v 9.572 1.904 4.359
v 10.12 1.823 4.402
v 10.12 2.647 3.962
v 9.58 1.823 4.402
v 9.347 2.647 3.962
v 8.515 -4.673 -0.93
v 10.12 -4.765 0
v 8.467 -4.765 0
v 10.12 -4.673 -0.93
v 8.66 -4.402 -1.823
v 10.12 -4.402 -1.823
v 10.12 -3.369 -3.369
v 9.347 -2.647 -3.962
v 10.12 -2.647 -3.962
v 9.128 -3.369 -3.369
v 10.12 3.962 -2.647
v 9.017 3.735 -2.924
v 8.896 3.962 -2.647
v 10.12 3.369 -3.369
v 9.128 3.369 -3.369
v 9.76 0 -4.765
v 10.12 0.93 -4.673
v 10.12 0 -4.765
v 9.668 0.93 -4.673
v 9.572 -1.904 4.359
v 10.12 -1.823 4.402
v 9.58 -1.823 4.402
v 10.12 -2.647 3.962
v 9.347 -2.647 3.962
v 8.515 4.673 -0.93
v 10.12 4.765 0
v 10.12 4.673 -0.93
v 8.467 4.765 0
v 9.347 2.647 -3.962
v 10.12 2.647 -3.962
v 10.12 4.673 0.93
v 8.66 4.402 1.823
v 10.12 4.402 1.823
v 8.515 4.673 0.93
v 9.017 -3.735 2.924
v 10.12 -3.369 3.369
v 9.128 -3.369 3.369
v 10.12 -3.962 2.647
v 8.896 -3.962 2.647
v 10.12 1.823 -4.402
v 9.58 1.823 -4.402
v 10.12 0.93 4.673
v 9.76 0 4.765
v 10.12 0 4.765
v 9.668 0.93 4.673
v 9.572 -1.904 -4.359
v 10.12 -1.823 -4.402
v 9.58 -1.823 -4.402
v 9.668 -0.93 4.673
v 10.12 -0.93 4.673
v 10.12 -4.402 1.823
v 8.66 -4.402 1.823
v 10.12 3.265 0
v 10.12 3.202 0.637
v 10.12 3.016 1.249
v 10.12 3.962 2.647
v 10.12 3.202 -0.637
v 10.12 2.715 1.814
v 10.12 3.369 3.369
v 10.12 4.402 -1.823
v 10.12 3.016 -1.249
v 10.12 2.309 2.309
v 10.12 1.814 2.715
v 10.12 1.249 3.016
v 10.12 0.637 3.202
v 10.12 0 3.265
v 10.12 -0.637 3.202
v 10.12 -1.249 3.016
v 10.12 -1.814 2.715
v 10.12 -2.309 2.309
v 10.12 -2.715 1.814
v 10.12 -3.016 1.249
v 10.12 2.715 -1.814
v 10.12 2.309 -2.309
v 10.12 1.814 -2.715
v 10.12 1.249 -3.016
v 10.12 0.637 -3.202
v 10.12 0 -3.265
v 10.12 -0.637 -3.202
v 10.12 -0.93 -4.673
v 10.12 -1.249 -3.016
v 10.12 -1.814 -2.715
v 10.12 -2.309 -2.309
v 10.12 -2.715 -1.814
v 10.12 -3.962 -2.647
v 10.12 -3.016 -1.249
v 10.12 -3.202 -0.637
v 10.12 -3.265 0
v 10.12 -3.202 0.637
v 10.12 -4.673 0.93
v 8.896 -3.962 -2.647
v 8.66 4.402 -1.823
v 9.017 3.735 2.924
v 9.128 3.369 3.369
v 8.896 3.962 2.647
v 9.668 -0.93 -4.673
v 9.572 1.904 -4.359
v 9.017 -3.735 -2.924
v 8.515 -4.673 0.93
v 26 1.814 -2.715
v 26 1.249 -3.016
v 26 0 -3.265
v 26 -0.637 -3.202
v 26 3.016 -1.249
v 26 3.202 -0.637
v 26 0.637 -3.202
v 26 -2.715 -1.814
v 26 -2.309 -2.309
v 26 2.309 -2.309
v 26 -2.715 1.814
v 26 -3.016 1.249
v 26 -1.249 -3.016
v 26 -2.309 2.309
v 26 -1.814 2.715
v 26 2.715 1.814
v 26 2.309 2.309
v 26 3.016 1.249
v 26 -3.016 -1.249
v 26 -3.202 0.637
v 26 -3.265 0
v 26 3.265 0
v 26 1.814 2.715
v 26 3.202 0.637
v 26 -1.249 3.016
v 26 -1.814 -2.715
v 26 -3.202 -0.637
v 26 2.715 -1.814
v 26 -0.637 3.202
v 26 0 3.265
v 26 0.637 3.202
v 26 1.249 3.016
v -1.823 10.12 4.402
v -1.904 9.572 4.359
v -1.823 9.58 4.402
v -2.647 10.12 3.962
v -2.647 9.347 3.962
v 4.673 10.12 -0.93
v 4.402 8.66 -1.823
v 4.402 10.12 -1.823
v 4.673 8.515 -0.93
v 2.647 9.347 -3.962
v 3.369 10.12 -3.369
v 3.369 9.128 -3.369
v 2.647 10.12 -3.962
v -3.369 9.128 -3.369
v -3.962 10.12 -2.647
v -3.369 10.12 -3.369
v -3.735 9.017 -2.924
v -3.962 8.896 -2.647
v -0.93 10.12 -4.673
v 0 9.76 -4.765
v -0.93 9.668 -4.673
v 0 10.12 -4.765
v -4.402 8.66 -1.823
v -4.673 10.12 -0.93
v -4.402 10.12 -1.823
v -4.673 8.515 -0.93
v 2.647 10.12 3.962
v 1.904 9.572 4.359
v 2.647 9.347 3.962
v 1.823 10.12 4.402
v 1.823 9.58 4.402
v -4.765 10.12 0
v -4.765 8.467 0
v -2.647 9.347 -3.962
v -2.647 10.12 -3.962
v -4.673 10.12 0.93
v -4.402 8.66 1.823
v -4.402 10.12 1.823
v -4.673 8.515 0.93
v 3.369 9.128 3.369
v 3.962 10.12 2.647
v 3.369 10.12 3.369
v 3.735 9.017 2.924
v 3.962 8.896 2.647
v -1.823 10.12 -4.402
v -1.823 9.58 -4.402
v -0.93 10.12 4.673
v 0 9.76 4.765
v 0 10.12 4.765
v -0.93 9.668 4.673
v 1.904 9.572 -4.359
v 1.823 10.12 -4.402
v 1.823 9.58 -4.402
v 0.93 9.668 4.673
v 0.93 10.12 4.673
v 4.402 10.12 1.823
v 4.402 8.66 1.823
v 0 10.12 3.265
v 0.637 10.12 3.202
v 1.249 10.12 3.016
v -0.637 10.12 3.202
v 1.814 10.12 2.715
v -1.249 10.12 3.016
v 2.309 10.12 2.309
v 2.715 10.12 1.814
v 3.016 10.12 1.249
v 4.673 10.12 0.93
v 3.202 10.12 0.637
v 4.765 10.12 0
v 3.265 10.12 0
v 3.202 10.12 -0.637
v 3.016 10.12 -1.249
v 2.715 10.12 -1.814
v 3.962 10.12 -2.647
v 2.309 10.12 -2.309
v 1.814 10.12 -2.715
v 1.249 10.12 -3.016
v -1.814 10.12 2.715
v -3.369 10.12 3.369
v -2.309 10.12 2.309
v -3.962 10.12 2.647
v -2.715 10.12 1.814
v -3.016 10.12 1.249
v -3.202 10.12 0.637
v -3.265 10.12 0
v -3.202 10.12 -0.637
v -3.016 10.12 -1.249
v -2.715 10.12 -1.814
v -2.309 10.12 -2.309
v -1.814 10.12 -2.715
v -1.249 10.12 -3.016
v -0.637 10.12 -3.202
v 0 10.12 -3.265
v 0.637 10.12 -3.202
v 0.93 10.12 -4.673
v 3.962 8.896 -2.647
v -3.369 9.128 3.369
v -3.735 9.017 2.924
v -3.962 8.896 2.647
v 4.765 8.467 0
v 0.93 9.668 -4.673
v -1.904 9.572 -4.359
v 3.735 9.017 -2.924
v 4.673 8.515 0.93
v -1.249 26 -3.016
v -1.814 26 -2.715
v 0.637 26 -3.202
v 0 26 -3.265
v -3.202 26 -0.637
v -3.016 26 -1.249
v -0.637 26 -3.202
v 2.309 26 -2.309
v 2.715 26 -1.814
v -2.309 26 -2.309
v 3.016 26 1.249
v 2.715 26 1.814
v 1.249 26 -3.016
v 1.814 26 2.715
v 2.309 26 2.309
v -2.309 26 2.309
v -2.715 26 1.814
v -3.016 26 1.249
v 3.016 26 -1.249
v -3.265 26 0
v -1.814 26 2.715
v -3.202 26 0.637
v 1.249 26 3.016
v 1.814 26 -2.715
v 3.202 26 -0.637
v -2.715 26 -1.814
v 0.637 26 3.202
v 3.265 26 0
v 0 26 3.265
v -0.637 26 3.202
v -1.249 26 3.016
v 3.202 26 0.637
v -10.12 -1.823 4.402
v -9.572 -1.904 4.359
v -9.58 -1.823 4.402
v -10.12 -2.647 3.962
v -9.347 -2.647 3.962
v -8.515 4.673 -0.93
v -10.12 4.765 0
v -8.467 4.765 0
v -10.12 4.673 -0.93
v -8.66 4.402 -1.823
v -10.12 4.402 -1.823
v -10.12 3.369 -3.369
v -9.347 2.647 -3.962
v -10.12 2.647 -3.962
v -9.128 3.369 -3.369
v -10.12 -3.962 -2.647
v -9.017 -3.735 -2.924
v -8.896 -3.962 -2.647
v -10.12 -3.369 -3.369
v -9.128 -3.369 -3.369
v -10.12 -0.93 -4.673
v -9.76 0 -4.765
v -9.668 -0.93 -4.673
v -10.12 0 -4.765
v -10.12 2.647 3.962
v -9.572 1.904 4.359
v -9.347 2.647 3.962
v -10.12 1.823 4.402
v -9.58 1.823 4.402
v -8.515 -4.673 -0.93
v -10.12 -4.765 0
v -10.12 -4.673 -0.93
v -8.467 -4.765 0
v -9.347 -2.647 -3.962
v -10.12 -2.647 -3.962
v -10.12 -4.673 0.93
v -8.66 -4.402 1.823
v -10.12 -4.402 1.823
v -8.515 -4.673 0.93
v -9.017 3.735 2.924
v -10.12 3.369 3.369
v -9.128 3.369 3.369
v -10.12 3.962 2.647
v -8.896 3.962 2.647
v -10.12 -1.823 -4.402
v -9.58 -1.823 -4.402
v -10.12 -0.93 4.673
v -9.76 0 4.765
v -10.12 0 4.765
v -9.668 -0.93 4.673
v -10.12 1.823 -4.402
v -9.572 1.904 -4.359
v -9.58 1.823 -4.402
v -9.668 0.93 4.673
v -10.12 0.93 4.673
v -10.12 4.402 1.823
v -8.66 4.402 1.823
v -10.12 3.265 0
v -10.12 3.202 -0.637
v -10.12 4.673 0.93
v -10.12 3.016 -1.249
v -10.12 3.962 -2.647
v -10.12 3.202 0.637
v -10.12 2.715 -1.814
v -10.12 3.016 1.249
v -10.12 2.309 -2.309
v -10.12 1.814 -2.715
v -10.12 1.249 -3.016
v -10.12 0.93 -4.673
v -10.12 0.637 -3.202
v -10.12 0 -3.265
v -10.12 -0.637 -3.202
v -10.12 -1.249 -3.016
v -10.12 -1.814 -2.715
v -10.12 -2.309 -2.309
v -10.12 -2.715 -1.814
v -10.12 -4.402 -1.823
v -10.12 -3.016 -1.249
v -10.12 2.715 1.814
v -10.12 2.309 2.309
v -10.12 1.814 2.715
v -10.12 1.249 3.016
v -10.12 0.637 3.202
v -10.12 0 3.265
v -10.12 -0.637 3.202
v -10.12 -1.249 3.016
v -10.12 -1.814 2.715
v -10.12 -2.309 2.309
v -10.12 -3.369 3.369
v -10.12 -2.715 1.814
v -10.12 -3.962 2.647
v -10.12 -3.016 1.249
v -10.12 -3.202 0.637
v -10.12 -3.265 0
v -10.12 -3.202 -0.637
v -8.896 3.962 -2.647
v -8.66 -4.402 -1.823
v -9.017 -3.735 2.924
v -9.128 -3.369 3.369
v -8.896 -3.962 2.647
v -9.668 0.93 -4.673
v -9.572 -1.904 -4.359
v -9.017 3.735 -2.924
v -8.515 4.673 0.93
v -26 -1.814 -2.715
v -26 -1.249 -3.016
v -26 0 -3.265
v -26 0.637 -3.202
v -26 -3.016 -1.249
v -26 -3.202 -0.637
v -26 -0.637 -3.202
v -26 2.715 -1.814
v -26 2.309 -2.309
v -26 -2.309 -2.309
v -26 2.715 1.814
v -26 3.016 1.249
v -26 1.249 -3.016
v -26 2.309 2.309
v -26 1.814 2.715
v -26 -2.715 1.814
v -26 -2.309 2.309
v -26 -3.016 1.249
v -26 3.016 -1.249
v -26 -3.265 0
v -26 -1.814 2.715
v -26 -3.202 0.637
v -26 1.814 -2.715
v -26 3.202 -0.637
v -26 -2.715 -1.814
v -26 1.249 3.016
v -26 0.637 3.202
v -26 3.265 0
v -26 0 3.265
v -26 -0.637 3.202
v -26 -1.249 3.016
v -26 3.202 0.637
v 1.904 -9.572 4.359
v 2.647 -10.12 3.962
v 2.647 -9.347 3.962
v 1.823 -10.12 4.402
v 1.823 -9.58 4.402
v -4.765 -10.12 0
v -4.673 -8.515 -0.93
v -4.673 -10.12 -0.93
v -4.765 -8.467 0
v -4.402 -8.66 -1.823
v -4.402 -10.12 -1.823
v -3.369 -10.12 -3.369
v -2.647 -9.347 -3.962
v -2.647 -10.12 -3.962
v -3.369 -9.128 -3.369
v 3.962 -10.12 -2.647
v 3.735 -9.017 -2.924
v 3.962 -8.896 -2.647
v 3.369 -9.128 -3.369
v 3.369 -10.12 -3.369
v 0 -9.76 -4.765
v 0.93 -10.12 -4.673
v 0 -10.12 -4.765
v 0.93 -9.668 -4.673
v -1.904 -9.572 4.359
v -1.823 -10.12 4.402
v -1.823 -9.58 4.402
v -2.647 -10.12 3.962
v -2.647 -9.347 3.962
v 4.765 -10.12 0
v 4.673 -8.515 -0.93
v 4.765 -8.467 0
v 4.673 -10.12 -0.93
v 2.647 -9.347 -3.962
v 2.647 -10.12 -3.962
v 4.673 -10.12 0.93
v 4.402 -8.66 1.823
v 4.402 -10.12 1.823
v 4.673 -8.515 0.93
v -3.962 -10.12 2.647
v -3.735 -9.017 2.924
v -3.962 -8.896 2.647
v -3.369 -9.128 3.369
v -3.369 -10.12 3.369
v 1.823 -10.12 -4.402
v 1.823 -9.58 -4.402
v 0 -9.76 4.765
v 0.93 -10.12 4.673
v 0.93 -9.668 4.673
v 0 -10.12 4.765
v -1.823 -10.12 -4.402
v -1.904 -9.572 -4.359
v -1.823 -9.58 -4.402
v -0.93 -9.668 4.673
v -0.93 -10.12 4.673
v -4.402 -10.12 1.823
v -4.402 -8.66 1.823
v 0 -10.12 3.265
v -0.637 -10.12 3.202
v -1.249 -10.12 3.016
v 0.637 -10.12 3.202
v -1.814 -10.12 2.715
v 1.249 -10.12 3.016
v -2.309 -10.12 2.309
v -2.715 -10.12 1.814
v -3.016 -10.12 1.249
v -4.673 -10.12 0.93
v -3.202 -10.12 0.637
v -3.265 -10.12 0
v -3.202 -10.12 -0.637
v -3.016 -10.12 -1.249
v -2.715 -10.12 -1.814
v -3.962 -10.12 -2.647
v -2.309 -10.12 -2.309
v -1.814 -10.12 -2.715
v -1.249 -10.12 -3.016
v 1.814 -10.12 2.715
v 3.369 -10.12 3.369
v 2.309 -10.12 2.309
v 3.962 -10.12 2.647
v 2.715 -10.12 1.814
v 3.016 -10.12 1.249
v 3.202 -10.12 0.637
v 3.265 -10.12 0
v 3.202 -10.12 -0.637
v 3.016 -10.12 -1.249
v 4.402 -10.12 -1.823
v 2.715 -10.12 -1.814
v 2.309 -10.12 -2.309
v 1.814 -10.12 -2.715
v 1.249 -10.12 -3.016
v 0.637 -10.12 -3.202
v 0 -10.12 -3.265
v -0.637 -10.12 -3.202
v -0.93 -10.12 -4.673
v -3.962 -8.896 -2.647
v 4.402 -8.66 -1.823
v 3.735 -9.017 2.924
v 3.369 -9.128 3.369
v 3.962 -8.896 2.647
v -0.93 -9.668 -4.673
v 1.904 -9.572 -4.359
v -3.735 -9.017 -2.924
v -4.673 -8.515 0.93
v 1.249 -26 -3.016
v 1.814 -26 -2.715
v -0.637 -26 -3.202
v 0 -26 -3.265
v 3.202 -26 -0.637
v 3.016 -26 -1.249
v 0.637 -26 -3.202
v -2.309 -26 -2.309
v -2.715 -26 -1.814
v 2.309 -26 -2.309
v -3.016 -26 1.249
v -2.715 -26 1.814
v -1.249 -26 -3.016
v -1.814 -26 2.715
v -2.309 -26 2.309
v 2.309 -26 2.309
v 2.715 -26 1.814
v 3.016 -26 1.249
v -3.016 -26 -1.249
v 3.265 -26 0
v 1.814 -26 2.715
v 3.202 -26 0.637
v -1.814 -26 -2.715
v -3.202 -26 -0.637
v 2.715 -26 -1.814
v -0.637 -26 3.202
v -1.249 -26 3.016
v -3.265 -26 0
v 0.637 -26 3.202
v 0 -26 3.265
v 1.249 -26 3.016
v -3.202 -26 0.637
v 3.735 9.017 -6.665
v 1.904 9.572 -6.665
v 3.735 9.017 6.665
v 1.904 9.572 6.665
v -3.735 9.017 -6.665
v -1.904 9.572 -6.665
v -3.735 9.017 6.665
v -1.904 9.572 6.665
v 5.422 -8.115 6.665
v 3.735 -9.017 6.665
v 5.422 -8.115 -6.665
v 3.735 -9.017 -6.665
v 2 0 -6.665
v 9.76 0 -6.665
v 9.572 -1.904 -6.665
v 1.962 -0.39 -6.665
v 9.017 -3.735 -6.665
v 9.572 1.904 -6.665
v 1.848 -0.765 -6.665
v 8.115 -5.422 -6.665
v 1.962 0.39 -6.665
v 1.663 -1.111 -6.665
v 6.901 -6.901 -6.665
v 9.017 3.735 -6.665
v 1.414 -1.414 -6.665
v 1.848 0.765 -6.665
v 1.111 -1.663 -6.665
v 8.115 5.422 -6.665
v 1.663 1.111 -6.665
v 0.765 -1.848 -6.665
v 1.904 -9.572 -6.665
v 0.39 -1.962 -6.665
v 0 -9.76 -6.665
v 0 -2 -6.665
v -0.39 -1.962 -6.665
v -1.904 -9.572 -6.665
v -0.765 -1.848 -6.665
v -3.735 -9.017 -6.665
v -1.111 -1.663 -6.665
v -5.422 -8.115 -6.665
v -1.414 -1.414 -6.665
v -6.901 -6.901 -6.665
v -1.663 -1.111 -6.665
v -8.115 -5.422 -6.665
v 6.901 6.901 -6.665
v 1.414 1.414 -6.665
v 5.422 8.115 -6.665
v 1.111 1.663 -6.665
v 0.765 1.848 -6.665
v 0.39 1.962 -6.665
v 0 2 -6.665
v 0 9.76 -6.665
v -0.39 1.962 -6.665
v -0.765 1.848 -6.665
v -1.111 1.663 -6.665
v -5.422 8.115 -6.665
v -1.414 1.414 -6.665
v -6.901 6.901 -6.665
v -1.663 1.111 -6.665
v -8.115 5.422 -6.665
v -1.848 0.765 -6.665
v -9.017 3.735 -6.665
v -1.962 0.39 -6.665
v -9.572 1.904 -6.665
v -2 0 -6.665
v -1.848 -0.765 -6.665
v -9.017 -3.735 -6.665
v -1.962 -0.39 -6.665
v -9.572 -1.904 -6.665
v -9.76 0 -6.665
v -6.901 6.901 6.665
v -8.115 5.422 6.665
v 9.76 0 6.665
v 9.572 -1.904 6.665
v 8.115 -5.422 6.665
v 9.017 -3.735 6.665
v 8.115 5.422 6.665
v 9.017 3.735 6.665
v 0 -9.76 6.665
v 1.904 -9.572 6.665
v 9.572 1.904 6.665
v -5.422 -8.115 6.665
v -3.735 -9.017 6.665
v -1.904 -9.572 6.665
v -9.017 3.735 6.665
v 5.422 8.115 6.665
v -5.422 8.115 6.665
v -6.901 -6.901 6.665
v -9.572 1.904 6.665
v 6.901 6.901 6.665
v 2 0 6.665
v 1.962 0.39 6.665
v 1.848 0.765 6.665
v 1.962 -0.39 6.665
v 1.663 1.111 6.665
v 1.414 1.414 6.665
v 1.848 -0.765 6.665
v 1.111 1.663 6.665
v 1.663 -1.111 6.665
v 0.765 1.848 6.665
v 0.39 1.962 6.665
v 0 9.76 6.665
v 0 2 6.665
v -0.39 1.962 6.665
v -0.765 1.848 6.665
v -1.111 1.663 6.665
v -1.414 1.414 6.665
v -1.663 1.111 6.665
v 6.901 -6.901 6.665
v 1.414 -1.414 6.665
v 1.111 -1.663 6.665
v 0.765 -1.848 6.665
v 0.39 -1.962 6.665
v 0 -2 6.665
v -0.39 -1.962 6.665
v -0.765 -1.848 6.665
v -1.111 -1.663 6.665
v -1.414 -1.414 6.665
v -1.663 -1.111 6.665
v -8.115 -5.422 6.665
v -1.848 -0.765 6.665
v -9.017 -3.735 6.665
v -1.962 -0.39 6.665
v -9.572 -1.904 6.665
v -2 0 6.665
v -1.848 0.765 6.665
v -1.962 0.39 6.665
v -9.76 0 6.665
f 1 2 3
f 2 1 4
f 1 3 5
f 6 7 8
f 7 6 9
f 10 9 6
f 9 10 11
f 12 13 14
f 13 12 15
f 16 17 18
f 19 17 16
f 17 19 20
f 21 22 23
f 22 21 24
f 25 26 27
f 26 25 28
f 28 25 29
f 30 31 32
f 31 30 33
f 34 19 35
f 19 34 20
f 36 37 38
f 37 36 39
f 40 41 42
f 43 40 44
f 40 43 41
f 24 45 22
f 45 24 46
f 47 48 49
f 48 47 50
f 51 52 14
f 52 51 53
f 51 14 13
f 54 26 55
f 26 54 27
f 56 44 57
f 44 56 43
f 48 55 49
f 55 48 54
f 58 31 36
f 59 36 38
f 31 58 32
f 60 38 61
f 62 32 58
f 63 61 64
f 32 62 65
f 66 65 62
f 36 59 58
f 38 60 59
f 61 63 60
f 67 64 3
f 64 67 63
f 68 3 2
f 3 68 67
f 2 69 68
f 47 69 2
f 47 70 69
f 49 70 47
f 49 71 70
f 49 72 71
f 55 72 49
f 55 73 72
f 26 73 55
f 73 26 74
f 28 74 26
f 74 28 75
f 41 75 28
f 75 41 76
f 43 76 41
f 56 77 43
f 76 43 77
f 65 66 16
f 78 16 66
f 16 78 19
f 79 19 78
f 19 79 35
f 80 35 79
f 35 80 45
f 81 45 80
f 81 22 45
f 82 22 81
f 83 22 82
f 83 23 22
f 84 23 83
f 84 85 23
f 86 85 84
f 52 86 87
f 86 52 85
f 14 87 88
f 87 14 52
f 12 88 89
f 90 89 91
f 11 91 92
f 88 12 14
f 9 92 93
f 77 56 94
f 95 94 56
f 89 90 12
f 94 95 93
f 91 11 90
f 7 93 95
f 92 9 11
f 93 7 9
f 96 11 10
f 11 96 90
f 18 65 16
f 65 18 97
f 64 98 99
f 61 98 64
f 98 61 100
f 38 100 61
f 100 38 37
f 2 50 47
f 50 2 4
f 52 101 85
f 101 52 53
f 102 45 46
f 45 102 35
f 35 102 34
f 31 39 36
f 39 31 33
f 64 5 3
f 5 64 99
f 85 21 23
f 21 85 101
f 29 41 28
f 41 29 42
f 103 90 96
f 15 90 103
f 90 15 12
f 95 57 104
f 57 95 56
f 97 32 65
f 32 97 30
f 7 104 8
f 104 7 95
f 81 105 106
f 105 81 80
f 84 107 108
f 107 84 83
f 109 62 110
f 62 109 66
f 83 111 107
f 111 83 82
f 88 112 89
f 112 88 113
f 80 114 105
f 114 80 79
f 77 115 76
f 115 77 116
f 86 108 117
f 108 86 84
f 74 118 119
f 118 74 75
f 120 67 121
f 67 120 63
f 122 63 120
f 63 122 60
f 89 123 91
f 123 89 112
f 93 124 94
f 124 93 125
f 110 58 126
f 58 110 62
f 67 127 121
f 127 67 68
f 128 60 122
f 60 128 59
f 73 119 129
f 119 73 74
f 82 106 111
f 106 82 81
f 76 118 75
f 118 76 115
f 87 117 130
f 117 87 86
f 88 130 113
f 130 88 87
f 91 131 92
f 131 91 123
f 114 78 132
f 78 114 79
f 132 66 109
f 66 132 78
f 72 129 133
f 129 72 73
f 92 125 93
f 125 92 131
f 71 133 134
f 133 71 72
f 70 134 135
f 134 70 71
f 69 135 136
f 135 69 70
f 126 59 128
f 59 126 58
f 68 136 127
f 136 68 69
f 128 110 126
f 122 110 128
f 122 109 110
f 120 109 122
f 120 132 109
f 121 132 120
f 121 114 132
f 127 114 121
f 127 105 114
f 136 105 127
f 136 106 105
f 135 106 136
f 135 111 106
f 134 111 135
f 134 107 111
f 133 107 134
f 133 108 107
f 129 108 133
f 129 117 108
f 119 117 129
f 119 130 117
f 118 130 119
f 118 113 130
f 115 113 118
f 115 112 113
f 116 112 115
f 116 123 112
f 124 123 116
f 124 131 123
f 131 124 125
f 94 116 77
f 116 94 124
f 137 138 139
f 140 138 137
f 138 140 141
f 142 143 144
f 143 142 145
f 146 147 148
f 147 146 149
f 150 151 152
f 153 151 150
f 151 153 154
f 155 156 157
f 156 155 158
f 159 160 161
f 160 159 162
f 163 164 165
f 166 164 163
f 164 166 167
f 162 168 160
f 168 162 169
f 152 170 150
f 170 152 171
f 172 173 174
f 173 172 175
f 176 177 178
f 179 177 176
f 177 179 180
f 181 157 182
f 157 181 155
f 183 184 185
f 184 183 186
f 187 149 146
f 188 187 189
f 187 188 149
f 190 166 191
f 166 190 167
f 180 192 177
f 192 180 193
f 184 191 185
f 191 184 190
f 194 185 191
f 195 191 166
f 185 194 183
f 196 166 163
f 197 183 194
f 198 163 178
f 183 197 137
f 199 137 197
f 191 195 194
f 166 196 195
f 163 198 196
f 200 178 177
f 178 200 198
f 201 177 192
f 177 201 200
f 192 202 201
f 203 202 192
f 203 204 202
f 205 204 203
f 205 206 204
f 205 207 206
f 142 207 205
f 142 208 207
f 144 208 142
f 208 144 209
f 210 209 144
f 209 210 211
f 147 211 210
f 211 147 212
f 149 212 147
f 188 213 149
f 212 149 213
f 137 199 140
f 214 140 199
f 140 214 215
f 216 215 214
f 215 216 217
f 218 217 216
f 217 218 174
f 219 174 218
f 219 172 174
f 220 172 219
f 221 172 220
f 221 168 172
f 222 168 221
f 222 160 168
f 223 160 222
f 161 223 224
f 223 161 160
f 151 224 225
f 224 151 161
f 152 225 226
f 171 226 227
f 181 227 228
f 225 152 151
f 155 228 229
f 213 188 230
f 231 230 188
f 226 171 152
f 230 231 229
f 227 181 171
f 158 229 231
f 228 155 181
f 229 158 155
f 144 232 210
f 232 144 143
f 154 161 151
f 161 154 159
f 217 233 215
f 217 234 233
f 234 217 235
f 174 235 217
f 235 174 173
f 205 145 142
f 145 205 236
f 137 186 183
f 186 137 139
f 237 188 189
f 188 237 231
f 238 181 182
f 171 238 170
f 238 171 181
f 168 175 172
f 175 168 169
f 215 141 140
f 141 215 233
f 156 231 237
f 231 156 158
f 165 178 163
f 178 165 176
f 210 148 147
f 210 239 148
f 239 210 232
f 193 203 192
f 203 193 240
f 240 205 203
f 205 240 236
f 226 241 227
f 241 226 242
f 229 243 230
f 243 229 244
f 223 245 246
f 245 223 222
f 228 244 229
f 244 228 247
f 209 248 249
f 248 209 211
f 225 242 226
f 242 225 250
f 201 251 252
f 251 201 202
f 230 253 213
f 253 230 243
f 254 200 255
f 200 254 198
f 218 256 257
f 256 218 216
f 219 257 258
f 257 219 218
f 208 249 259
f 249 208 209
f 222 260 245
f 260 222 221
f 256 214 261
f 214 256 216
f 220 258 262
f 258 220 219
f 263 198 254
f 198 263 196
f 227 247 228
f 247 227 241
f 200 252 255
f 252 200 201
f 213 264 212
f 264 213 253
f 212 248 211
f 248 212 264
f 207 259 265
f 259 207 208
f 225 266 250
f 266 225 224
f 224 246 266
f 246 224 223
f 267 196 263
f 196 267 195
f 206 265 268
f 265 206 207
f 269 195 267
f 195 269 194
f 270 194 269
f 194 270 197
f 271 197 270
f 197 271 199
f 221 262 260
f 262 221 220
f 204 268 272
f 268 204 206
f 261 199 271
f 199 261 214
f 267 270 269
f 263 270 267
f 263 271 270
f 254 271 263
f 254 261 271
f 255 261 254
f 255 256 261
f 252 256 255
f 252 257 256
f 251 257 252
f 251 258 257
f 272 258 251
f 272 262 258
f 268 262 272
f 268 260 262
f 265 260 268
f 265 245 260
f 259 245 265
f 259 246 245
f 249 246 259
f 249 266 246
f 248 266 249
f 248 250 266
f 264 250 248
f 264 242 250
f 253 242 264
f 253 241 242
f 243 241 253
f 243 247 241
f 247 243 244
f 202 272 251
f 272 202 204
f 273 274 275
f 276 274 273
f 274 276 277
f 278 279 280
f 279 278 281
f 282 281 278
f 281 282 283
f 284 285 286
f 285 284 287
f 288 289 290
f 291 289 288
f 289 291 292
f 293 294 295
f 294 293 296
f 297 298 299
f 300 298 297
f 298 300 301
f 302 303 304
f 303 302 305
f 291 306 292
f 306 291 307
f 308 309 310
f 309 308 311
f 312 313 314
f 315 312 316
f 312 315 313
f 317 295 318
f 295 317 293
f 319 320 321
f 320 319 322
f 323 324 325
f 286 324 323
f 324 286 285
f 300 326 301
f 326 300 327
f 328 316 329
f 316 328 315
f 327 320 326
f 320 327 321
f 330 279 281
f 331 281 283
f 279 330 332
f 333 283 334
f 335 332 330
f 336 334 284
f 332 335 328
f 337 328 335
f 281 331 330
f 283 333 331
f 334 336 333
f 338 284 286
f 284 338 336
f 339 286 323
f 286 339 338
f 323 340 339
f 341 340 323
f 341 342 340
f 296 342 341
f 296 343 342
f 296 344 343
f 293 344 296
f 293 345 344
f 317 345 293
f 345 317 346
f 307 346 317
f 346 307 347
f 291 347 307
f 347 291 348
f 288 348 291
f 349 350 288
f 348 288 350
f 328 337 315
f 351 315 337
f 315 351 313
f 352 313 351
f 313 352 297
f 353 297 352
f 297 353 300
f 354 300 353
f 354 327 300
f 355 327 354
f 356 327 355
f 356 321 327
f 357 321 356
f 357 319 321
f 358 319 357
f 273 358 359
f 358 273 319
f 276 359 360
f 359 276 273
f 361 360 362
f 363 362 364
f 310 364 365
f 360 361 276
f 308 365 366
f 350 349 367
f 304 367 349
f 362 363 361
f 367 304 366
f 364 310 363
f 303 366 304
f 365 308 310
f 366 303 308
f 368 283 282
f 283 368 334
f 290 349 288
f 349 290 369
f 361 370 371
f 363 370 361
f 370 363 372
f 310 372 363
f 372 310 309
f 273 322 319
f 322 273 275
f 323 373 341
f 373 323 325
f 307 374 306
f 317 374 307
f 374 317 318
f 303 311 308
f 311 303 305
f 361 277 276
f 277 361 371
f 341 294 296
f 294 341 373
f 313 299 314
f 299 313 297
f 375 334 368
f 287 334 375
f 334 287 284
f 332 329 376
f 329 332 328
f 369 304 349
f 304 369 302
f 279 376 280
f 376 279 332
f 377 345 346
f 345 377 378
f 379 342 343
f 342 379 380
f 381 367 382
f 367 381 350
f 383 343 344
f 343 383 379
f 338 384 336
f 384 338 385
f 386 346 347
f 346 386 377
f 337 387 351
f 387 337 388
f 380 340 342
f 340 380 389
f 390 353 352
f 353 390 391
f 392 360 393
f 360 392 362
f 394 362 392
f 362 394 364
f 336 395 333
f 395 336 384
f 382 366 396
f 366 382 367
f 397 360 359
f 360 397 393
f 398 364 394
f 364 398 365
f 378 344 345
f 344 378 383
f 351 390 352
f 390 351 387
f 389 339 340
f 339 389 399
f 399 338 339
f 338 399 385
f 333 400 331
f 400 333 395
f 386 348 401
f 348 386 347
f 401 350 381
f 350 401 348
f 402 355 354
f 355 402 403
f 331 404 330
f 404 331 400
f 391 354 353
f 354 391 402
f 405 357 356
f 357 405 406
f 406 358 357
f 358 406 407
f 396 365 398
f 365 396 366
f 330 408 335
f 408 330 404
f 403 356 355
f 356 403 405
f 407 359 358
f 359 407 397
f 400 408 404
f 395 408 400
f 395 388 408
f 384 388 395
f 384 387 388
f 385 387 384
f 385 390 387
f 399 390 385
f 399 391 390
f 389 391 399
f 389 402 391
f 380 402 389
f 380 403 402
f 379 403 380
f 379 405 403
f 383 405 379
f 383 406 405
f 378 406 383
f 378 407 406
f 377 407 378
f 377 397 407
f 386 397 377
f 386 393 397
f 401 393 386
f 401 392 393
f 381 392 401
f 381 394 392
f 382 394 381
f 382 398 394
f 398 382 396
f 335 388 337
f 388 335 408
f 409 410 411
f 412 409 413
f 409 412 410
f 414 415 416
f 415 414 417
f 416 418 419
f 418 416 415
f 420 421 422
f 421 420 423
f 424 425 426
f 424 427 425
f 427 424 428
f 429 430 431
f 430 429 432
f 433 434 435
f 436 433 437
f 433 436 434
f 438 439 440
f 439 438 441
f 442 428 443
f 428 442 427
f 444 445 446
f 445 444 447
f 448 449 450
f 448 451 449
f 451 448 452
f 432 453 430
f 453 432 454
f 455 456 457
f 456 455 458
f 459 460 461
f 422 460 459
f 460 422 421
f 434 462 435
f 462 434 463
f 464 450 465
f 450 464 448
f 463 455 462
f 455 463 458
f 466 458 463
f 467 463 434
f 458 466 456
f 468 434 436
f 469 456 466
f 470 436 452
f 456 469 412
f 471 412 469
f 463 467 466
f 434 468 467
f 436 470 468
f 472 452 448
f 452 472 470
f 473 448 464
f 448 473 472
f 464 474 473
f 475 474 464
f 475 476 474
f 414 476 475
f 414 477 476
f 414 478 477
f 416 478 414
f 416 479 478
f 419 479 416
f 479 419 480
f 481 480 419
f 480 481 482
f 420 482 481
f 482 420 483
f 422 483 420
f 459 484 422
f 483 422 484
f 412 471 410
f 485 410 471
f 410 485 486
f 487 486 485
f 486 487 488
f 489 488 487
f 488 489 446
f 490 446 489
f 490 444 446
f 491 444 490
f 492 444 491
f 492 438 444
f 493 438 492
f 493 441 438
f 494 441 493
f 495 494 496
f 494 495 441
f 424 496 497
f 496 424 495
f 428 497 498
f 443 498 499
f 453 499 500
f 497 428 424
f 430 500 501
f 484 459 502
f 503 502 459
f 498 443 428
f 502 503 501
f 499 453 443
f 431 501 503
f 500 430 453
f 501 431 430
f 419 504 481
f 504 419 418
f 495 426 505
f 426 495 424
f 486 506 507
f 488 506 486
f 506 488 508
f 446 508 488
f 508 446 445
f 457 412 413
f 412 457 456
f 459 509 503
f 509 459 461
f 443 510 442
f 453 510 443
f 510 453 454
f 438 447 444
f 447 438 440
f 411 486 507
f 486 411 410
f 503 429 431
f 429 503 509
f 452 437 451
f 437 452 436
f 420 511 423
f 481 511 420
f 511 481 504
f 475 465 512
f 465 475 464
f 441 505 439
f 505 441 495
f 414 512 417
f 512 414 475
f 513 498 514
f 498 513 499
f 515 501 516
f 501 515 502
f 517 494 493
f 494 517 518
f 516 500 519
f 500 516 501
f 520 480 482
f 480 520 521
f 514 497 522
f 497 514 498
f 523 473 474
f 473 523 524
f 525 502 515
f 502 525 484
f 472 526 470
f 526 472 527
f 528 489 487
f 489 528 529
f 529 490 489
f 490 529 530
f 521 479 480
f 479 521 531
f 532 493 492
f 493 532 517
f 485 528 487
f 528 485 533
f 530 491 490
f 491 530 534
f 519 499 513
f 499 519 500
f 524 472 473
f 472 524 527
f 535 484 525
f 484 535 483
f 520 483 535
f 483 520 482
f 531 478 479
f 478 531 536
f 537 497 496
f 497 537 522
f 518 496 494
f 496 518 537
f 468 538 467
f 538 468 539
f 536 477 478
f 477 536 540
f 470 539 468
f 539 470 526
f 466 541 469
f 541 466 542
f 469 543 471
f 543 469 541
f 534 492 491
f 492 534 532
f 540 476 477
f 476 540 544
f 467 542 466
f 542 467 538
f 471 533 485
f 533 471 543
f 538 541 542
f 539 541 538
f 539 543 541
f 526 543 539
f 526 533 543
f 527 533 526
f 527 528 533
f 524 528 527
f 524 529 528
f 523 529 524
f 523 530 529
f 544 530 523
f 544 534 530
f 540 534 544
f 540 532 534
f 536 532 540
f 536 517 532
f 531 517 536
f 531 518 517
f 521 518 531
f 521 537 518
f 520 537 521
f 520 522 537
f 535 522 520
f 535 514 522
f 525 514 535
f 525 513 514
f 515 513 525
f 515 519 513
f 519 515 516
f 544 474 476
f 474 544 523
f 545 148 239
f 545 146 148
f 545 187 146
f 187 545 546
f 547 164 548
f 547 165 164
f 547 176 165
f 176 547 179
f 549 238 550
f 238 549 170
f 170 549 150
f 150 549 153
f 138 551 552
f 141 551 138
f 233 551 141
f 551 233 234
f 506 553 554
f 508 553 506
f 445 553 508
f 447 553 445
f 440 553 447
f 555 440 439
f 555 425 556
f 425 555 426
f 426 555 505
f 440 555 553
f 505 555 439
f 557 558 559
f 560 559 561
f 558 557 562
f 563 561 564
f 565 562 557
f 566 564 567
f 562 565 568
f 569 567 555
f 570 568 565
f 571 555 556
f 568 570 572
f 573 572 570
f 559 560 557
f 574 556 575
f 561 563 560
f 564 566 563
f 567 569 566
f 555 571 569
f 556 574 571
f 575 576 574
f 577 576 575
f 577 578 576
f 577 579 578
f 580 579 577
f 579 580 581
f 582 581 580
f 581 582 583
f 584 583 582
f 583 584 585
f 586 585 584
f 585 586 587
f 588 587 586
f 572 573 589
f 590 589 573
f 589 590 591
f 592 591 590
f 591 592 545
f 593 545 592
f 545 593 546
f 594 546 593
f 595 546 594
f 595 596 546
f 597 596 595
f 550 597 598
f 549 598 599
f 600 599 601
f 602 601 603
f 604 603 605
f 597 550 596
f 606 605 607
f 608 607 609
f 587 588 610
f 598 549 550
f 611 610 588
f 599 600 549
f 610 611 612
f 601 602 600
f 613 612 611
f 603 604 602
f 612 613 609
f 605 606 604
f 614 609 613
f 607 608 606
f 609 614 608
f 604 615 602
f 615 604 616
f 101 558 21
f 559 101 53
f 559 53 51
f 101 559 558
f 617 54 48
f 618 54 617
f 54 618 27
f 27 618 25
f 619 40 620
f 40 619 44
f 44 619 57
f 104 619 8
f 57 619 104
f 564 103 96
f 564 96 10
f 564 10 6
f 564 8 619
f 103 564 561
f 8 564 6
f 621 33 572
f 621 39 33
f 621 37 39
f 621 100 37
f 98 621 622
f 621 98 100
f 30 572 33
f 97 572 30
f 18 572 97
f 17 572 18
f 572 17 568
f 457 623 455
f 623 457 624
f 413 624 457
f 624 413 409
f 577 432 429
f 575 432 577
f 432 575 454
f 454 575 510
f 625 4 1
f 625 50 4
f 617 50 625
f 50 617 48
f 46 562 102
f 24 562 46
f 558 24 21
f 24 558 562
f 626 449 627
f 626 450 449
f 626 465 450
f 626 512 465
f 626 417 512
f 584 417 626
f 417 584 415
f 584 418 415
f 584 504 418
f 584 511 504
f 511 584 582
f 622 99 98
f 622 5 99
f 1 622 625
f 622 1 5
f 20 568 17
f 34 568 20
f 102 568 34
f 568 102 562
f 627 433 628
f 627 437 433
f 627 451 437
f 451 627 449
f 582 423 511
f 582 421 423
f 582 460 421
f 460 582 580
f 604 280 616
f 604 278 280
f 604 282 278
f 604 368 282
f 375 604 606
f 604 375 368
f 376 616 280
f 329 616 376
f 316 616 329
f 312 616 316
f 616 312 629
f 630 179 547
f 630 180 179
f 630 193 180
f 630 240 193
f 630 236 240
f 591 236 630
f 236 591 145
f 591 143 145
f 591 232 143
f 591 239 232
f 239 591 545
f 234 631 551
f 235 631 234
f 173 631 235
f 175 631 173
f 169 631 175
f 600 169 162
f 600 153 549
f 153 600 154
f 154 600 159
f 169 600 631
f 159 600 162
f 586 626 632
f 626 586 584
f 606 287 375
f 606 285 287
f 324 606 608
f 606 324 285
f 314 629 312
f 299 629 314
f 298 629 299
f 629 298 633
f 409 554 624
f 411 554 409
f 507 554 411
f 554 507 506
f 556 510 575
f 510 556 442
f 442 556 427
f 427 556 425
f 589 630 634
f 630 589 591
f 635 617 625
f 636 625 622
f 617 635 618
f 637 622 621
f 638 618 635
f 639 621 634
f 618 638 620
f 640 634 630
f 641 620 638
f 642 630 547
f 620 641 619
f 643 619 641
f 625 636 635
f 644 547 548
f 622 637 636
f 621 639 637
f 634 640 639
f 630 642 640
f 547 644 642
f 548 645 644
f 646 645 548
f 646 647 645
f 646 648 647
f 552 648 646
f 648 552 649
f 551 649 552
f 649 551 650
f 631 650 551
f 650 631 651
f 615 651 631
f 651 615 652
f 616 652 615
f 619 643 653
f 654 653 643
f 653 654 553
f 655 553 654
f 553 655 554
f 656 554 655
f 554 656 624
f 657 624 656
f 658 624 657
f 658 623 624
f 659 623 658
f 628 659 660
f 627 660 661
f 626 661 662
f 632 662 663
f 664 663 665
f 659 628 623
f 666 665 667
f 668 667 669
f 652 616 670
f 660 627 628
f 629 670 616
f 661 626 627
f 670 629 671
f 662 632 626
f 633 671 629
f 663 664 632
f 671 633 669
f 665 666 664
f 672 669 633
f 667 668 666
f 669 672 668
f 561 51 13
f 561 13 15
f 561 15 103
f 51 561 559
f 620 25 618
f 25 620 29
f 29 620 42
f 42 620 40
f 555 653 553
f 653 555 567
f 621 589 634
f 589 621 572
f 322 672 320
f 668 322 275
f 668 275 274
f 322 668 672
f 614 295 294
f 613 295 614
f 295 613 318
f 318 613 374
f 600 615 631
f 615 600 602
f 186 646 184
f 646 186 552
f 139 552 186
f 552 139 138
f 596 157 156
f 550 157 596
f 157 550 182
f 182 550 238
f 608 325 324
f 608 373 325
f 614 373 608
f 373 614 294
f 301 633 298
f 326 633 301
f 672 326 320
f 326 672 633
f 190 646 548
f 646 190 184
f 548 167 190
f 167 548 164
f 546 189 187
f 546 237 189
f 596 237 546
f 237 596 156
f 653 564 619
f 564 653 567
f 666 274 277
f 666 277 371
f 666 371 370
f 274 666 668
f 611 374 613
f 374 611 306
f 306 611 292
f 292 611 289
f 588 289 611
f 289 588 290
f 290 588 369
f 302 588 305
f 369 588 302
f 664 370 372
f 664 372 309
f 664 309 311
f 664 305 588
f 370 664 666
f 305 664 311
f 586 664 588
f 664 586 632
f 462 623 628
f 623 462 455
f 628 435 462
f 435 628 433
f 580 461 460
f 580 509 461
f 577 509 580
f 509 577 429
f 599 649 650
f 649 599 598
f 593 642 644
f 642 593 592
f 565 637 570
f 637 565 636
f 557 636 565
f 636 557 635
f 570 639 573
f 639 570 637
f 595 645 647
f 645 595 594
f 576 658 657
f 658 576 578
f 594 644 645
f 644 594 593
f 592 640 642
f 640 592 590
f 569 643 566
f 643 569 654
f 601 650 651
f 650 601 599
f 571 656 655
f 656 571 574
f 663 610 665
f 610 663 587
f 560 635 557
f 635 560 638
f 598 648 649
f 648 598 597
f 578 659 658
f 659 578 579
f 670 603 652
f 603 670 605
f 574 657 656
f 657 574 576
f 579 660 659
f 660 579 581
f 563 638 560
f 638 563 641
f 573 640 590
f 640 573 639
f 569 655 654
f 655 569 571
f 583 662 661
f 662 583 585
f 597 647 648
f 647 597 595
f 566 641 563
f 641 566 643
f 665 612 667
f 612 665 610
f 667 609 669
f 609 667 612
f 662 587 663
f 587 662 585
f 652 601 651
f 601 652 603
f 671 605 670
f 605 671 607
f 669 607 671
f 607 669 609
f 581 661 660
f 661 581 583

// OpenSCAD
$fn = 32;

// ----------------------------------------------------------------------
// Cardan cross: 52 mm span, 9.53 mm trunnions
// ----------------------------------------------------------------------

// --- parameters (mm) ---
journal_d = 9.53;         // trunnion diameter
arm_len = 26;             // trunnion length from the centre
step_r = 3.24;            // step position from the centre
step_d = 6.53;            // journal diameter after the step
hub_d = 19.52;            // hub diameter
hub_h = 13.33;            // hub height
bore_d = 4;               // hub bore

difference() {
  union() {
    /* hub along the joint axis */
    cylinder(h = hub_h, d = hub_d, center = true);
    for (a = [0 : 90 : 270]) rotate([0, 0, a]) {
      /* trunnion, sunk into the hub */
      translate([hub_d / 4, 0, 0]) rotate([0, 90, 0]) cylinder(h = step_r + 2, d = journal_d);
      /* stepped journal out to the tip */
      translate([step_r - 0.5, 0, 0]) rotate([0, 90, 0]) cylinder(h = arm_len + 0.5 - step_r, d = step_d);
    }
  }
  /* lubrication bore through the hub, 2.5 mm clear on both sides */
  translate([0, 0, -hub_h / 2 - 2.5]) cylinder(h = hub_h + 5, d = bore_d);
}
